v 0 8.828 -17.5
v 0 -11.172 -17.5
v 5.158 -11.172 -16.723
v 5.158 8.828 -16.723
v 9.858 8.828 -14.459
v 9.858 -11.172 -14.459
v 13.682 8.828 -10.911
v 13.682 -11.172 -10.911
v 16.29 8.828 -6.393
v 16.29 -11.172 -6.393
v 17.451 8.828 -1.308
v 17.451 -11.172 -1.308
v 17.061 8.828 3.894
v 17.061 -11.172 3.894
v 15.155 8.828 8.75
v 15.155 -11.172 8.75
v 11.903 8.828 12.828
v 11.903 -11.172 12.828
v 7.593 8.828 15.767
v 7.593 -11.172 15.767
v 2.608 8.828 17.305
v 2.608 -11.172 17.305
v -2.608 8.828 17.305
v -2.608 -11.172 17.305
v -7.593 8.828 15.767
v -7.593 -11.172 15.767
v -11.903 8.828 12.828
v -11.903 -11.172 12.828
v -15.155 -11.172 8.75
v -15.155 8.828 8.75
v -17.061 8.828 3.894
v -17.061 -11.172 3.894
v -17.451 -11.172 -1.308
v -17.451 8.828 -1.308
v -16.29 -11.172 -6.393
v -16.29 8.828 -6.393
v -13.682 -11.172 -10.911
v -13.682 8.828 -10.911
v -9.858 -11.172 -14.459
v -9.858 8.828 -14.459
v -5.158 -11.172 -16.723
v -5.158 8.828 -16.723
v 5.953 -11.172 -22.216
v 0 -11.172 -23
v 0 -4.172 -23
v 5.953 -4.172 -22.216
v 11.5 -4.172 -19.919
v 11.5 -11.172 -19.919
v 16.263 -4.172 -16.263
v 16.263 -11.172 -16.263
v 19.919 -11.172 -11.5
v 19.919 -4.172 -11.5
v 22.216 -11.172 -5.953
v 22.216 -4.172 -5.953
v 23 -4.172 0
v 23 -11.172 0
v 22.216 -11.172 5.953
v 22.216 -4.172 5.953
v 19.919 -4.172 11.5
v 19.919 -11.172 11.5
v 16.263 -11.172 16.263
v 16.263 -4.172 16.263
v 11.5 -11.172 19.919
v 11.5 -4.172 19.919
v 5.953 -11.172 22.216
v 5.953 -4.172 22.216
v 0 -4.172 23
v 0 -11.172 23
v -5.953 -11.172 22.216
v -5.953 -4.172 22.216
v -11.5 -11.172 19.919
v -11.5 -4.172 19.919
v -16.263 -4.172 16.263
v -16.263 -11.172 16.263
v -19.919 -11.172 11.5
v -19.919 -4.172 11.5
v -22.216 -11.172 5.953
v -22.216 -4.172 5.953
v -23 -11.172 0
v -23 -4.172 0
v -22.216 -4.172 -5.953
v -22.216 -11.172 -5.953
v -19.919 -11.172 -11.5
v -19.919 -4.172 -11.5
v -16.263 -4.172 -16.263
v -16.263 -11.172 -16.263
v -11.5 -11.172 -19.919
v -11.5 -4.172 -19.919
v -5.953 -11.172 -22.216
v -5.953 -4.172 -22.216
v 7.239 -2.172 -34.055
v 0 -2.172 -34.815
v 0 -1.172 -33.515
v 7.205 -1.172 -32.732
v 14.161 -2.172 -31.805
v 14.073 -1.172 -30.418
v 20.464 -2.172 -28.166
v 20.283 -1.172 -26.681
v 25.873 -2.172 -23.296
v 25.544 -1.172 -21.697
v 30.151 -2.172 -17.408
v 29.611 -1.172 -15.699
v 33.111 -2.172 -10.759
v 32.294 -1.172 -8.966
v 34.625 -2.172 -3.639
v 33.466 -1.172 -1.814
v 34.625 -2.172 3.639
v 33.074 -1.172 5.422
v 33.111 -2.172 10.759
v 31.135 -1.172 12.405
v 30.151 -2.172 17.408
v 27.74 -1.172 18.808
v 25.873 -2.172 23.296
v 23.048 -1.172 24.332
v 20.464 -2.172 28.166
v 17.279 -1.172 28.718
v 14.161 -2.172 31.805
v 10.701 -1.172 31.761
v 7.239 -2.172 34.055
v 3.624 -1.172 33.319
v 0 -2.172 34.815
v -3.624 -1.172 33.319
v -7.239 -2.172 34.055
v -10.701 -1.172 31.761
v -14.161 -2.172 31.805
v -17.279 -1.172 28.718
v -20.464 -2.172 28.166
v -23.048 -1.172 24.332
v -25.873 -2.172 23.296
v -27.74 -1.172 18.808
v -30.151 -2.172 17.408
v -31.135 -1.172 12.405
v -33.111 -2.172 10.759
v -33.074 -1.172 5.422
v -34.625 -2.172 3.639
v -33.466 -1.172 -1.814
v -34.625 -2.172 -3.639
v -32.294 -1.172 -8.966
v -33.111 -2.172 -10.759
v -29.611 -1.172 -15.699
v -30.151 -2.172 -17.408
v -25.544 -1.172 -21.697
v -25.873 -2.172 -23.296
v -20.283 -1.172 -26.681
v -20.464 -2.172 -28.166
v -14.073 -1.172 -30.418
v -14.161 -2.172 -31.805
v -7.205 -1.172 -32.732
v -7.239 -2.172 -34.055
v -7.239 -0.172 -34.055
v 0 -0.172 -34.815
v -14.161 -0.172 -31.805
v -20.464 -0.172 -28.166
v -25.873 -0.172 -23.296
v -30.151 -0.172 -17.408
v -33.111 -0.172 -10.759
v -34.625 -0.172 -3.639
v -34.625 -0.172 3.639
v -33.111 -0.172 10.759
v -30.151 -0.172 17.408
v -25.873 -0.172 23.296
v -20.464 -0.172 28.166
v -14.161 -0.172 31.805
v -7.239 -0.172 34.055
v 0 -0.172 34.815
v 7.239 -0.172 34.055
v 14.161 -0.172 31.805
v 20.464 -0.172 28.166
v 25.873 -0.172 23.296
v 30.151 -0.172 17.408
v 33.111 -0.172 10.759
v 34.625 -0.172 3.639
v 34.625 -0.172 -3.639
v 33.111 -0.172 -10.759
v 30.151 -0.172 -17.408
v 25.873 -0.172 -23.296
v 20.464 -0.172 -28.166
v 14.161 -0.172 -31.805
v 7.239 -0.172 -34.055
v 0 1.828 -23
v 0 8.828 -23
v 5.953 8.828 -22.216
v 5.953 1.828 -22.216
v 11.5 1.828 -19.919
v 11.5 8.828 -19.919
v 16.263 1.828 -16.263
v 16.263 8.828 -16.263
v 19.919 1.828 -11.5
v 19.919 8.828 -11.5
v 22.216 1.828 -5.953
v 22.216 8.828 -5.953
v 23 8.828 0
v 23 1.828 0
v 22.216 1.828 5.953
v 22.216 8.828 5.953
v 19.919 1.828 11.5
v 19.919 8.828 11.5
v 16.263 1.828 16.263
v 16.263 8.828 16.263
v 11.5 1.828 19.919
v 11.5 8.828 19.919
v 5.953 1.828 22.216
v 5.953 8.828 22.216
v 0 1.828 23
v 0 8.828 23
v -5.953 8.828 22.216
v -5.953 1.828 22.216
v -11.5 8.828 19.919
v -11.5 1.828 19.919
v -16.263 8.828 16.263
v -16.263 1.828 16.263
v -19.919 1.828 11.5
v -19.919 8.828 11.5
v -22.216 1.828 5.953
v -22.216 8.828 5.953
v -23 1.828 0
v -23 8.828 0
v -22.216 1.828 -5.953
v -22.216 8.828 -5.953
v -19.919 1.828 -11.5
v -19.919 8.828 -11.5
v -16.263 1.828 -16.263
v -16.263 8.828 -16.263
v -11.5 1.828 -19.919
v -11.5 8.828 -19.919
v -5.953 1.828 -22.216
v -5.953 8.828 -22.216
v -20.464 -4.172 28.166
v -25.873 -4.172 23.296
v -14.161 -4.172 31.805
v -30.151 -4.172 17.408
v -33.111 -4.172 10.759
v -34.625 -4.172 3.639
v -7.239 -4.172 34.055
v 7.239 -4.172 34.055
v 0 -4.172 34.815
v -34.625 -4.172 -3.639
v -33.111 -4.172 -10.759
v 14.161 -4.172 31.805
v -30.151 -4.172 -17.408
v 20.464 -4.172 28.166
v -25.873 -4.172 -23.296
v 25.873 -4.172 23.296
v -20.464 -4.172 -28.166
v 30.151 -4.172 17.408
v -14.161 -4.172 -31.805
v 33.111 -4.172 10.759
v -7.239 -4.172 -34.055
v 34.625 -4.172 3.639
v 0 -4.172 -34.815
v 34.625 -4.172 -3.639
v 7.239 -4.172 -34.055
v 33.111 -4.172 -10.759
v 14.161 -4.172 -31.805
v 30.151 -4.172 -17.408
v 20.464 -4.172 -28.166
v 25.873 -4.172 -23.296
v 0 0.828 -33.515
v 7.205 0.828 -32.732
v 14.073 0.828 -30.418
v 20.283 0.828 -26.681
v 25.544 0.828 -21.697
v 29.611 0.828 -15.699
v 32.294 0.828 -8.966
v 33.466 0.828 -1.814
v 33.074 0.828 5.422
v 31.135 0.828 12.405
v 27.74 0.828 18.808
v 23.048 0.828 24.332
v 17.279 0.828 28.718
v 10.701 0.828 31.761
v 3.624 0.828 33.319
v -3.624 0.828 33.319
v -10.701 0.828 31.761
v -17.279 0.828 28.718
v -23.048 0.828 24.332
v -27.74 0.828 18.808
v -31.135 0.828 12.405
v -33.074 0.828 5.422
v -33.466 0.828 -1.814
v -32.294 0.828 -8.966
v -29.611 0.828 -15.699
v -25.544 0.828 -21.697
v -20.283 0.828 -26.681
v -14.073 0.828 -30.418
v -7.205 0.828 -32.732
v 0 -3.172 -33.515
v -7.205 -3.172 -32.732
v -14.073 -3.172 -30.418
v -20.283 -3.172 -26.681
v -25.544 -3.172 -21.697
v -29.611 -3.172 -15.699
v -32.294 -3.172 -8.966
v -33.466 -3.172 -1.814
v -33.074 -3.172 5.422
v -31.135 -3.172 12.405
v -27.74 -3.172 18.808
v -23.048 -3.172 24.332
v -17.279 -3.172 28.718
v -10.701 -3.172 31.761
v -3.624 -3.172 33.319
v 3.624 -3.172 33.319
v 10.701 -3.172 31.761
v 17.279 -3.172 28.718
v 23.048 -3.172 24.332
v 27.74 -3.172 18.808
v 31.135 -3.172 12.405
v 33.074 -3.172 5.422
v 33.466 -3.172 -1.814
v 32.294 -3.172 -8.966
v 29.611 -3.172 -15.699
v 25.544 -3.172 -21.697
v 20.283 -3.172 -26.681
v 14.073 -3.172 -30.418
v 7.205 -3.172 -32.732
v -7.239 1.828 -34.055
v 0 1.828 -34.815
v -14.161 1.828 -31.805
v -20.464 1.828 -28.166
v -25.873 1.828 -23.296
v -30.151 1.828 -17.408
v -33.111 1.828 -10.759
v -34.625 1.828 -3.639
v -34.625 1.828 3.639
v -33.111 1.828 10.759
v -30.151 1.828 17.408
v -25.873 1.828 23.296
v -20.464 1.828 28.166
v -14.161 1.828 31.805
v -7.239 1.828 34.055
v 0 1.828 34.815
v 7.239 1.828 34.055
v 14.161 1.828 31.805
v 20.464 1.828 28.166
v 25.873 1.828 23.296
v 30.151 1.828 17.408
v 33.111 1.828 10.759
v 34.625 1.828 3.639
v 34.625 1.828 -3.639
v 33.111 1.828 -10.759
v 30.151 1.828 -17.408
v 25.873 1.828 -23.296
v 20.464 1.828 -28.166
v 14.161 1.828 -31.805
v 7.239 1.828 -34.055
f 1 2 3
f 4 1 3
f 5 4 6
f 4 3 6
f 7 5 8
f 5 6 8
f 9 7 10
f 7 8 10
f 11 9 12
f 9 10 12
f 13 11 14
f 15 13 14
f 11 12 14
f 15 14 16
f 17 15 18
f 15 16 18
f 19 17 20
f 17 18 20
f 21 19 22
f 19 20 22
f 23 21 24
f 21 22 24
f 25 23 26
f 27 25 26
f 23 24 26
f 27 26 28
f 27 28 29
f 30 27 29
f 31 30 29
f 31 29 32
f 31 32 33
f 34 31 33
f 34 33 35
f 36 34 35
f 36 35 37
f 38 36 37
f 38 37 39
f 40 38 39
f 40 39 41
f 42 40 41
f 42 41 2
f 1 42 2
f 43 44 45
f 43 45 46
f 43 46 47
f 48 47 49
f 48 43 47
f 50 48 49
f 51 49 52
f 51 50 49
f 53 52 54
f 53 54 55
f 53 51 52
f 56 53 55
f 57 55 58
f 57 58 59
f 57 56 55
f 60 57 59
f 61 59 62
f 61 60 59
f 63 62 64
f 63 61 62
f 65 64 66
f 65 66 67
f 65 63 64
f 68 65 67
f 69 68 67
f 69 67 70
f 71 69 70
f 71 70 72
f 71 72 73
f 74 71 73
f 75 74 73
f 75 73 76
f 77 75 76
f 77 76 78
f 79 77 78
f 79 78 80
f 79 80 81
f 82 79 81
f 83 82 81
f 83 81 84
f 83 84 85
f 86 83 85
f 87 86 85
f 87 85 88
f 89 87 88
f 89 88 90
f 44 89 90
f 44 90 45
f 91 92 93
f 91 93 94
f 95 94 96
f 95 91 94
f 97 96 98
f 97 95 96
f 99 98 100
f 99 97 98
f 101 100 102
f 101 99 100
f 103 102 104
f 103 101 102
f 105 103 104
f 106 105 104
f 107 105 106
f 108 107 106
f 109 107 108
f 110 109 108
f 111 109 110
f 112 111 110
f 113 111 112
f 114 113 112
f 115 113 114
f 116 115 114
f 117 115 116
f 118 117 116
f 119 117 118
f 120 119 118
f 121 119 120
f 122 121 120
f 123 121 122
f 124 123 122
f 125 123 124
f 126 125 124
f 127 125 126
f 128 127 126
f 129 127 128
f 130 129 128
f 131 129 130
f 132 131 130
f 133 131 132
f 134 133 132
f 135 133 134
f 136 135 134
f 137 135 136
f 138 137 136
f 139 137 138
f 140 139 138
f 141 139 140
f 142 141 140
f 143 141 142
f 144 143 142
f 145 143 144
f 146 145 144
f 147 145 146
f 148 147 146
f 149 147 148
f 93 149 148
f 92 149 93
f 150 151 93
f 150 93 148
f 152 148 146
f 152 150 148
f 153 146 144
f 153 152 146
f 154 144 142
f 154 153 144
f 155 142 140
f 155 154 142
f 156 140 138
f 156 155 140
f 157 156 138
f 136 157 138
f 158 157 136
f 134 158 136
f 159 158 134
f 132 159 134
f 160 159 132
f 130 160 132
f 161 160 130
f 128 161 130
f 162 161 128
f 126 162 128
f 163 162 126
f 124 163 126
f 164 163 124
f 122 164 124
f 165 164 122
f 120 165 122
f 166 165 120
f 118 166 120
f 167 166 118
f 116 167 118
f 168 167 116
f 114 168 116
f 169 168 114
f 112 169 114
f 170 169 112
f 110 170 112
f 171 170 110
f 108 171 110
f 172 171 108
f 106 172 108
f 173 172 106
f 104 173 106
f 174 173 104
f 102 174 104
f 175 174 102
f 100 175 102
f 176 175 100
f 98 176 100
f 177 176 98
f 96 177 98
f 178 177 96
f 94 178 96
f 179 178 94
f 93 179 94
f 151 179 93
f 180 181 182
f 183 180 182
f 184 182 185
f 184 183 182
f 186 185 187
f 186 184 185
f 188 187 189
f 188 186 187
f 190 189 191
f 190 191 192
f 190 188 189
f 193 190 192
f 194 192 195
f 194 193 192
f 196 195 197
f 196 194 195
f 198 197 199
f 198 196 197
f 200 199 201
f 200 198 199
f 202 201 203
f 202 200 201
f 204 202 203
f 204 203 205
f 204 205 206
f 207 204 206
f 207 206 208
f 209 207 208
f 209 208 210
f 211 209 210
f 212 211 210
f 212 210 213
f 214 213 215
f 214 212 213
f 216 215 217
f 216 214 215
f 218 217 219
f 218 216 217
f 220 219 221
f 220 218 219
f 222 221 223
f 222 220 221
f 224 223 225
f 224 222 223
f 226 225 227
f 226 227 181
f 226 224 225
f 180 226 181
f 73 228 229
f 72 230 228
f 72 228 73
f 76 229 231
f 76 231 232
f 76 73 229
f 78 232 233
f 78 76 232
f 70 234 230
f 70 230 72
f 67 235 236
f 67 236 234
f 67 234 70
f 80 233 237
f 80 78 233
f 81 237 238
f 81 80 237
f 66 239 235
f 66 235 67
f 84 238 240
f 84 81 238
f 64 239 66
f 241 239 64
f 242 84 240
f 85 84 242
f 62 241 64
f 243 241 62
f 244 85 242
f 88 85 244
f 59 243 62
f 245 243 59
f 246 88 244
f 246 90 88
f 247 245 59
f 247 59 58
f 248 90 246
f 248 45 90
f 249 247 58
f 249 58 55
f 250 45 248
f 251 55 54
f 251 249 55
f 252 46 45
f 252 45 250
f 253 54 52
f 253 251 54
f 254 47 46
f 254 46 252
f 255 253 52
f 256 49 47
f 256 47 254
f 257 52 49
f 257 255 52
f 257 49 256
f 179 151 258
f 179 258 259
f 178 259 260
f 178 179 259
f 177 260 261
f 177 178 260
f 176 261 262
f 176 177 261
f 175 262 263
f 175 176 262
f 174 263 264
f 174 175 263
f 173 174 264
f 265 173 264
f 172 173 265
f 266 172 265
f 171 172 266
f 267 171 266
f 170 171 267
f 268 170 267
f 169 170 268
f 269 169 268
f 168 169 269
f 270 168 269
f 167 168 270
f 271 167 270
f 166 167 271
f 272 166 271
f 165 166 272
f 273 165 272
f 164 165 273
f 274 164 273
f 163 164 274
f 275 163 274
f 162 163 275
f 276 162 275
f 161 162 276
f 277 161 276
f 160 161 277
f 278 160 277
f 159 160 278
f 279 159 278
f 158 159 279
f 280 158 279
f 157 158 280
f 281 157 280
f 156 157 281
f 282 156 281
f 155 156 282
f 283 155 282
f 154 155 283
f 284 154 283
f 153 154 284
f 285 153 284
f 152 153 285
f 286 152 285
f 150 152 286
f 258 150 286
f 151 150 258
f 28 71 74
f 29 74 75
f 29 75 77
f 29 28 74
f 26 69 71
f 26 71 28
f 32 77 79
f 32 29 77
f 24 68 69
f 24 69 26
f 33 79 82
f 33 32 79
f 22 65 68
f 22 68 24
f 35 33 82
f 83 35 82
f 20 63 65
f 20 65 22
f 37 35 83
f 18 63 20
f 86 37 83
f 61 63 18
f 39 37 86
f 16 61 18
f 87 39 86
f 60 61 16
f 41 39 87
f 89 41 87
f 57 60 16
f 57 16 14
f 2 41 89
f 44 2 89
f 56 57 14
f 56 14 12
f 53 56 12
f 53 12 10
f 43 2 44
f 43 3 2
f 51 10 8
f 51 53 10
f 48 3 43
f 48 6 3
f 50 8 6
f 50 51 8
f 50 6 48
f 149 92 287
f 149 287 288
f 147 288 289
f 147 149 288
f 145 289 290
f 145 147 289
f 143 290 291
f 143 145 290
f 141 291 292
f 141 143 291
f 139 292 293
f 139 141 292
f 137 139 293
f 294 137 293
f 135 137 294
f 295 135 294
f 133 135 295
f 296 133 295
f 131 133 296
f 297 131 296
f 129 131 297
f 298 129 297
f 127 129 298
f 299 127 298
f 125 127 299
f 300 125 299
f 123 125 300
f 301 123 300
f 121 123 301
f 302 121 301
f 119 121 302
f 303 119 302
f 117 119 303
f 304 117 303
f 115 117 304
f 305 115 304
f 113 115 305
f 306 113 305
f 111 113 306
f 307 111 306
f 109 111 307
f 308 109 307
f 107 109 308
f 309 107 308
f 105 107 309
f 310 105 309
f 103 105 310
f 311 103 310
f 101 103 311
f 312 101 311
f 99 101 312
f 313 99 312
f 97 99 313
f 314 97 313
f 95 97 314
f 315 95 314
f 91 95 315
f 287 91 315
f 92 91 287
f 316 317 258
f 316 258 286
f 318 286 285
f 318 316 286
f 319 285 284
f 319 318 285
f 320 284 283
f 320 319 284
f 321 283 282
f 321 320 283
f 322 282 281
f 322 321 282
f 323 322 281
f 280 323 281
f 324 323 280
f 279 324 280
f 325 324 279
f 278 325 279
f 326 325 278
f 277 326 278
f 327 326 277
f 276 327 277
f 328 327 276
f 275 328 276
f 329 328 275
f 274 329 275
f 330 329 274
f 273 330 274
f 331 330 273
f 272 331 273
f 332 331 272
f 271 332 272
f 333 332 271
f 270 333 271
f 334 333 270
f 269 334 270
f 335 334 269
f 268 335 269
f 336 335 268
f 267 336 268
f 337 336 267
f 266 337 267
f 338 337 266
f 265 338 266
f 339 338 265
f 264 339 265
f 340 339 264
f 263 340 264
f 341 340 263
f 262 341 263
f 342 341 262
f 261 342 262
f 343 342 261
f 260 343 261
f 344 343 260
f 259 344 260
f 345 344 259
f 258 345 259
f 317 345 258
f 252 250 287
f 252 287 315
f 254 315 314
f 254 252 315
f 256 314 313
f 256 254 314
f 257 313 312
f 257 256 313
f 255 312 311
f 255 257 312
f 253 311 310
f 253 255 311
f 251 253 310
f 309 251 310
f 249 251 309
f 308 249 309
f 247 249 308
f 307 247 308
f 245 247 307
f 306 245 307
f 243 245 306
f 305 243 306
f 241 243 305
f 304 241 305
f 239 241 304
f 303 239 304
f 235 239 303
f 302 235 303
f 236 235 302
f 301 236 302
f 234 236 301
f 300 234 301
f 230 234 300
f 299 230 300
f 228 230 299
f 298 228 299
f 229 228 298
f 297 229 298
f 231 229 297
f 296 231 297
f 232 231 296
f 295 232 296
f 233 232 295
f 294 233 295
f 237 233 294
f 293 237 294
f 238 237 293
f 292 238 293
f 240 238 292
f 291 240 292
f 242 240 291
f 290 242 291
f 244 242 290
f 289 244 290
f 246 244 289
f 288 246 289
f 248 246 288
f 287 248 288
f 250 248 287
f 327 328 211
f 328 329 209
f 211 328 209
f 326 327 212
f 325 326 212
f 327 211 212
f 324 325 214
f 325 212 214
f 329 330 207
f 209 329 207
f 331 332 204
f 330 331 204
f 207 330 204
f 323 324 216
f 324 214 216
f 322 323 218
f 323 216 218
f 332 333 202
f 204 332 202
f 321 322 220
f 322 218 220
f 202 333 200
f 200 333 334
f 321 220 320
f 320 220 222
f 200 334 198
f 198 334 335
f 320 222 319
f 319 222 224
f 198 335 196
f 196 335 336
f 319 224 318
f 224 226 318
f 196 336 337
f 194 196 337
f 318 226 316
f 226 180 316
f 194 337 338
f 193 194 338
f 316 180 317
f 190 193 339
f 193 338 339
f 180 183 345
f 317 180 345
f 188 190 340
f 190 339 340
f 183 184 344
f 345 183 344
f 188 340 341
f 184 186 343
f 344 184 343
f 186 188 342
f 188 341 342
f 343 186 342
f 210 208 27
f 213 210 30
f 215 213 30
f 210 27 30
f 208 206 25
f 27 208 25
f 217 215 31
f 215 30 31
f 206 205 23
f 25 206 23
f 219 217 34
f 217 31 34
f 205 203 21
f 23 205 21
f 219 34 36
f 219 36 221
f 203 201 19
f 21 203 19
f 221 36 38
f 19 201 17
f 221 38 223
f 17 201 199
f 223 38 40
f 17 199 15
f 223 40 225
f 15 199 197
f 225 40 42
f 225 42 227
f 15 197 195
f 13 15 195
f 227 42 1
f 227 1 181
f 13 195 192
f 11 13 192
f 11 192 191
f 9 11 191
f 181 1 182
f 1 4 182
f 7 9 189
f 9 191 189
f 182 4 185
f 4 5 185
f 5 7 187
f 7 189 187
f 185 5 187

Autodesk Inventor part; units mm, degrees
ref_plane "YZ Plane" through (0, 0, 0) normal (1, 0, 0) x (0, 1, 0)
ref_plane "XZ Plane" through (0, 0, 0) normal (0, 1, 0) x (-1, 0, 0)
ref_plane "XY Plane" through (0, 0, 0) normal (0, 0, 1) x (1, 0, 0)
sketch "Sketch1" plane through (0, 0, 0) normal (1, 0, 0) x (0, 1, 0)
  line L0 (10.3439, 0) -> (-10.3439, 0) construction
  line L1 (8.828, -17.5) -> (-11.172, -17.5)
  line L2 (8.828, -17.5) -> (8.828, -23)
  line L3 (8.828, -23) -> (1.828, -23)
  line L4 (1.828, -23) -> (1.828, -34.8153)
  line L5 (1.828, -34.8153) -> (-4.172, -34.8153)
  line L6 (-4.172, -34.8153) -> (-4.172, -23)
  line L7 (-4.172, -23) -> (-11.172, -23)
  line L8 (-11.172, -23) -> (-11.172, -17.5)
  line L9 (0, 48.9131) -> (0, -72.8322) construction
  point P0 (0, 0)
  point P1 (0, 0)
  dimension "d0" = 35
  dimension "d1" = 5.5
  dimension "d2" = 6
  dimension "d3" = 7
revolve "Revolution1" add sketch "Sketch1" angle 360 about axis through (0, 10.3439, 0) along (0, -1, 0)
sketch "Sketch2" plane through (0, 0, 0) normal (1, 0, 0) x (0, 1, 0)
  line L0 (1.828, 34.8153) -> (1.828, -34.8153) projected
  line L1 (-4.172, 34.8153) -> (-4.172, -34.8153) projected
  line L2 (1.828, 34.8153) -> (1.828, -34.8153) projected
  line L3 (-4.172, 34.8153) -> (-4.172, -34.8153) projected
  line L4 (1.828, 34.8153) -> (1.828, -34.8153) projected
  line L5 (-4.172, 34.8153) -> (-4.172, -34.8153) projected
  line L6 (1.828, 34.8153) -> (1.828, -34.8153) construction
  line L7 (-4.172, 34.8153) -> (-4.172, -34.8153) construction
  line L8 (1.828, 34.8153) -> (1.828, -34.8153) construction
  line L9 (-4.172, 34.8153) -> (-4.172, -34.8153) construction
  line L10 (1.828, 34.8153) -> (1.828, -34.8153) construction
  line L11 (-4.172, 34.8153) -> (-4.172, -34.8153) construction
  line L12 (0.828, -33.5153) -> (1.828, -34.8153) construction
  line L13 (1.828, -34.8153) -> (-0.172, -34.8153) construction
  line L14 (-0.172, -34.8153) -> (0.828, -33.5153) construction
  line L15 (0.828, -34.8153) -> (0.828, -33.5153) construction
  line L16 (1.828, -34.8153) -> (-4.172, -34.8153) construction
  line L17 (0.828, -33.5153) -> (1.828, -34.8153)
  line L18 (-0.172, -34.8153) -> (1.828, -34.8153)
  line L19 (0.828, -33.5153) -> (-0.172, -34.8153)
  point P0 (0, 0)
  dimension "d5" = 1.3
  dimension "d6" = 2
sketch "Sketch3" plane through (0, 0, 0) normal (0, 0, 1) x (1, 0, 0)
  point P0 (0, 0)
sketch "Sketch4" plane through (0, 0, 0) normal (1, 0, 0) x (0, 1, 0)
  line L0 (14.7871, 0) -> (-17.2316, 0)
  point P0 (0, 0)
revolve "Revolution2" cut sketch "Sketch2" angle 360 about axis through (0, 14.7871, 0) along (0, -1, 0)
pattern_linear "Rectangular Pattern1" count 4 spacing 2 along (0, -1, 0) of "Revolution2"
properties part number "34_Vong_chan_dau"
